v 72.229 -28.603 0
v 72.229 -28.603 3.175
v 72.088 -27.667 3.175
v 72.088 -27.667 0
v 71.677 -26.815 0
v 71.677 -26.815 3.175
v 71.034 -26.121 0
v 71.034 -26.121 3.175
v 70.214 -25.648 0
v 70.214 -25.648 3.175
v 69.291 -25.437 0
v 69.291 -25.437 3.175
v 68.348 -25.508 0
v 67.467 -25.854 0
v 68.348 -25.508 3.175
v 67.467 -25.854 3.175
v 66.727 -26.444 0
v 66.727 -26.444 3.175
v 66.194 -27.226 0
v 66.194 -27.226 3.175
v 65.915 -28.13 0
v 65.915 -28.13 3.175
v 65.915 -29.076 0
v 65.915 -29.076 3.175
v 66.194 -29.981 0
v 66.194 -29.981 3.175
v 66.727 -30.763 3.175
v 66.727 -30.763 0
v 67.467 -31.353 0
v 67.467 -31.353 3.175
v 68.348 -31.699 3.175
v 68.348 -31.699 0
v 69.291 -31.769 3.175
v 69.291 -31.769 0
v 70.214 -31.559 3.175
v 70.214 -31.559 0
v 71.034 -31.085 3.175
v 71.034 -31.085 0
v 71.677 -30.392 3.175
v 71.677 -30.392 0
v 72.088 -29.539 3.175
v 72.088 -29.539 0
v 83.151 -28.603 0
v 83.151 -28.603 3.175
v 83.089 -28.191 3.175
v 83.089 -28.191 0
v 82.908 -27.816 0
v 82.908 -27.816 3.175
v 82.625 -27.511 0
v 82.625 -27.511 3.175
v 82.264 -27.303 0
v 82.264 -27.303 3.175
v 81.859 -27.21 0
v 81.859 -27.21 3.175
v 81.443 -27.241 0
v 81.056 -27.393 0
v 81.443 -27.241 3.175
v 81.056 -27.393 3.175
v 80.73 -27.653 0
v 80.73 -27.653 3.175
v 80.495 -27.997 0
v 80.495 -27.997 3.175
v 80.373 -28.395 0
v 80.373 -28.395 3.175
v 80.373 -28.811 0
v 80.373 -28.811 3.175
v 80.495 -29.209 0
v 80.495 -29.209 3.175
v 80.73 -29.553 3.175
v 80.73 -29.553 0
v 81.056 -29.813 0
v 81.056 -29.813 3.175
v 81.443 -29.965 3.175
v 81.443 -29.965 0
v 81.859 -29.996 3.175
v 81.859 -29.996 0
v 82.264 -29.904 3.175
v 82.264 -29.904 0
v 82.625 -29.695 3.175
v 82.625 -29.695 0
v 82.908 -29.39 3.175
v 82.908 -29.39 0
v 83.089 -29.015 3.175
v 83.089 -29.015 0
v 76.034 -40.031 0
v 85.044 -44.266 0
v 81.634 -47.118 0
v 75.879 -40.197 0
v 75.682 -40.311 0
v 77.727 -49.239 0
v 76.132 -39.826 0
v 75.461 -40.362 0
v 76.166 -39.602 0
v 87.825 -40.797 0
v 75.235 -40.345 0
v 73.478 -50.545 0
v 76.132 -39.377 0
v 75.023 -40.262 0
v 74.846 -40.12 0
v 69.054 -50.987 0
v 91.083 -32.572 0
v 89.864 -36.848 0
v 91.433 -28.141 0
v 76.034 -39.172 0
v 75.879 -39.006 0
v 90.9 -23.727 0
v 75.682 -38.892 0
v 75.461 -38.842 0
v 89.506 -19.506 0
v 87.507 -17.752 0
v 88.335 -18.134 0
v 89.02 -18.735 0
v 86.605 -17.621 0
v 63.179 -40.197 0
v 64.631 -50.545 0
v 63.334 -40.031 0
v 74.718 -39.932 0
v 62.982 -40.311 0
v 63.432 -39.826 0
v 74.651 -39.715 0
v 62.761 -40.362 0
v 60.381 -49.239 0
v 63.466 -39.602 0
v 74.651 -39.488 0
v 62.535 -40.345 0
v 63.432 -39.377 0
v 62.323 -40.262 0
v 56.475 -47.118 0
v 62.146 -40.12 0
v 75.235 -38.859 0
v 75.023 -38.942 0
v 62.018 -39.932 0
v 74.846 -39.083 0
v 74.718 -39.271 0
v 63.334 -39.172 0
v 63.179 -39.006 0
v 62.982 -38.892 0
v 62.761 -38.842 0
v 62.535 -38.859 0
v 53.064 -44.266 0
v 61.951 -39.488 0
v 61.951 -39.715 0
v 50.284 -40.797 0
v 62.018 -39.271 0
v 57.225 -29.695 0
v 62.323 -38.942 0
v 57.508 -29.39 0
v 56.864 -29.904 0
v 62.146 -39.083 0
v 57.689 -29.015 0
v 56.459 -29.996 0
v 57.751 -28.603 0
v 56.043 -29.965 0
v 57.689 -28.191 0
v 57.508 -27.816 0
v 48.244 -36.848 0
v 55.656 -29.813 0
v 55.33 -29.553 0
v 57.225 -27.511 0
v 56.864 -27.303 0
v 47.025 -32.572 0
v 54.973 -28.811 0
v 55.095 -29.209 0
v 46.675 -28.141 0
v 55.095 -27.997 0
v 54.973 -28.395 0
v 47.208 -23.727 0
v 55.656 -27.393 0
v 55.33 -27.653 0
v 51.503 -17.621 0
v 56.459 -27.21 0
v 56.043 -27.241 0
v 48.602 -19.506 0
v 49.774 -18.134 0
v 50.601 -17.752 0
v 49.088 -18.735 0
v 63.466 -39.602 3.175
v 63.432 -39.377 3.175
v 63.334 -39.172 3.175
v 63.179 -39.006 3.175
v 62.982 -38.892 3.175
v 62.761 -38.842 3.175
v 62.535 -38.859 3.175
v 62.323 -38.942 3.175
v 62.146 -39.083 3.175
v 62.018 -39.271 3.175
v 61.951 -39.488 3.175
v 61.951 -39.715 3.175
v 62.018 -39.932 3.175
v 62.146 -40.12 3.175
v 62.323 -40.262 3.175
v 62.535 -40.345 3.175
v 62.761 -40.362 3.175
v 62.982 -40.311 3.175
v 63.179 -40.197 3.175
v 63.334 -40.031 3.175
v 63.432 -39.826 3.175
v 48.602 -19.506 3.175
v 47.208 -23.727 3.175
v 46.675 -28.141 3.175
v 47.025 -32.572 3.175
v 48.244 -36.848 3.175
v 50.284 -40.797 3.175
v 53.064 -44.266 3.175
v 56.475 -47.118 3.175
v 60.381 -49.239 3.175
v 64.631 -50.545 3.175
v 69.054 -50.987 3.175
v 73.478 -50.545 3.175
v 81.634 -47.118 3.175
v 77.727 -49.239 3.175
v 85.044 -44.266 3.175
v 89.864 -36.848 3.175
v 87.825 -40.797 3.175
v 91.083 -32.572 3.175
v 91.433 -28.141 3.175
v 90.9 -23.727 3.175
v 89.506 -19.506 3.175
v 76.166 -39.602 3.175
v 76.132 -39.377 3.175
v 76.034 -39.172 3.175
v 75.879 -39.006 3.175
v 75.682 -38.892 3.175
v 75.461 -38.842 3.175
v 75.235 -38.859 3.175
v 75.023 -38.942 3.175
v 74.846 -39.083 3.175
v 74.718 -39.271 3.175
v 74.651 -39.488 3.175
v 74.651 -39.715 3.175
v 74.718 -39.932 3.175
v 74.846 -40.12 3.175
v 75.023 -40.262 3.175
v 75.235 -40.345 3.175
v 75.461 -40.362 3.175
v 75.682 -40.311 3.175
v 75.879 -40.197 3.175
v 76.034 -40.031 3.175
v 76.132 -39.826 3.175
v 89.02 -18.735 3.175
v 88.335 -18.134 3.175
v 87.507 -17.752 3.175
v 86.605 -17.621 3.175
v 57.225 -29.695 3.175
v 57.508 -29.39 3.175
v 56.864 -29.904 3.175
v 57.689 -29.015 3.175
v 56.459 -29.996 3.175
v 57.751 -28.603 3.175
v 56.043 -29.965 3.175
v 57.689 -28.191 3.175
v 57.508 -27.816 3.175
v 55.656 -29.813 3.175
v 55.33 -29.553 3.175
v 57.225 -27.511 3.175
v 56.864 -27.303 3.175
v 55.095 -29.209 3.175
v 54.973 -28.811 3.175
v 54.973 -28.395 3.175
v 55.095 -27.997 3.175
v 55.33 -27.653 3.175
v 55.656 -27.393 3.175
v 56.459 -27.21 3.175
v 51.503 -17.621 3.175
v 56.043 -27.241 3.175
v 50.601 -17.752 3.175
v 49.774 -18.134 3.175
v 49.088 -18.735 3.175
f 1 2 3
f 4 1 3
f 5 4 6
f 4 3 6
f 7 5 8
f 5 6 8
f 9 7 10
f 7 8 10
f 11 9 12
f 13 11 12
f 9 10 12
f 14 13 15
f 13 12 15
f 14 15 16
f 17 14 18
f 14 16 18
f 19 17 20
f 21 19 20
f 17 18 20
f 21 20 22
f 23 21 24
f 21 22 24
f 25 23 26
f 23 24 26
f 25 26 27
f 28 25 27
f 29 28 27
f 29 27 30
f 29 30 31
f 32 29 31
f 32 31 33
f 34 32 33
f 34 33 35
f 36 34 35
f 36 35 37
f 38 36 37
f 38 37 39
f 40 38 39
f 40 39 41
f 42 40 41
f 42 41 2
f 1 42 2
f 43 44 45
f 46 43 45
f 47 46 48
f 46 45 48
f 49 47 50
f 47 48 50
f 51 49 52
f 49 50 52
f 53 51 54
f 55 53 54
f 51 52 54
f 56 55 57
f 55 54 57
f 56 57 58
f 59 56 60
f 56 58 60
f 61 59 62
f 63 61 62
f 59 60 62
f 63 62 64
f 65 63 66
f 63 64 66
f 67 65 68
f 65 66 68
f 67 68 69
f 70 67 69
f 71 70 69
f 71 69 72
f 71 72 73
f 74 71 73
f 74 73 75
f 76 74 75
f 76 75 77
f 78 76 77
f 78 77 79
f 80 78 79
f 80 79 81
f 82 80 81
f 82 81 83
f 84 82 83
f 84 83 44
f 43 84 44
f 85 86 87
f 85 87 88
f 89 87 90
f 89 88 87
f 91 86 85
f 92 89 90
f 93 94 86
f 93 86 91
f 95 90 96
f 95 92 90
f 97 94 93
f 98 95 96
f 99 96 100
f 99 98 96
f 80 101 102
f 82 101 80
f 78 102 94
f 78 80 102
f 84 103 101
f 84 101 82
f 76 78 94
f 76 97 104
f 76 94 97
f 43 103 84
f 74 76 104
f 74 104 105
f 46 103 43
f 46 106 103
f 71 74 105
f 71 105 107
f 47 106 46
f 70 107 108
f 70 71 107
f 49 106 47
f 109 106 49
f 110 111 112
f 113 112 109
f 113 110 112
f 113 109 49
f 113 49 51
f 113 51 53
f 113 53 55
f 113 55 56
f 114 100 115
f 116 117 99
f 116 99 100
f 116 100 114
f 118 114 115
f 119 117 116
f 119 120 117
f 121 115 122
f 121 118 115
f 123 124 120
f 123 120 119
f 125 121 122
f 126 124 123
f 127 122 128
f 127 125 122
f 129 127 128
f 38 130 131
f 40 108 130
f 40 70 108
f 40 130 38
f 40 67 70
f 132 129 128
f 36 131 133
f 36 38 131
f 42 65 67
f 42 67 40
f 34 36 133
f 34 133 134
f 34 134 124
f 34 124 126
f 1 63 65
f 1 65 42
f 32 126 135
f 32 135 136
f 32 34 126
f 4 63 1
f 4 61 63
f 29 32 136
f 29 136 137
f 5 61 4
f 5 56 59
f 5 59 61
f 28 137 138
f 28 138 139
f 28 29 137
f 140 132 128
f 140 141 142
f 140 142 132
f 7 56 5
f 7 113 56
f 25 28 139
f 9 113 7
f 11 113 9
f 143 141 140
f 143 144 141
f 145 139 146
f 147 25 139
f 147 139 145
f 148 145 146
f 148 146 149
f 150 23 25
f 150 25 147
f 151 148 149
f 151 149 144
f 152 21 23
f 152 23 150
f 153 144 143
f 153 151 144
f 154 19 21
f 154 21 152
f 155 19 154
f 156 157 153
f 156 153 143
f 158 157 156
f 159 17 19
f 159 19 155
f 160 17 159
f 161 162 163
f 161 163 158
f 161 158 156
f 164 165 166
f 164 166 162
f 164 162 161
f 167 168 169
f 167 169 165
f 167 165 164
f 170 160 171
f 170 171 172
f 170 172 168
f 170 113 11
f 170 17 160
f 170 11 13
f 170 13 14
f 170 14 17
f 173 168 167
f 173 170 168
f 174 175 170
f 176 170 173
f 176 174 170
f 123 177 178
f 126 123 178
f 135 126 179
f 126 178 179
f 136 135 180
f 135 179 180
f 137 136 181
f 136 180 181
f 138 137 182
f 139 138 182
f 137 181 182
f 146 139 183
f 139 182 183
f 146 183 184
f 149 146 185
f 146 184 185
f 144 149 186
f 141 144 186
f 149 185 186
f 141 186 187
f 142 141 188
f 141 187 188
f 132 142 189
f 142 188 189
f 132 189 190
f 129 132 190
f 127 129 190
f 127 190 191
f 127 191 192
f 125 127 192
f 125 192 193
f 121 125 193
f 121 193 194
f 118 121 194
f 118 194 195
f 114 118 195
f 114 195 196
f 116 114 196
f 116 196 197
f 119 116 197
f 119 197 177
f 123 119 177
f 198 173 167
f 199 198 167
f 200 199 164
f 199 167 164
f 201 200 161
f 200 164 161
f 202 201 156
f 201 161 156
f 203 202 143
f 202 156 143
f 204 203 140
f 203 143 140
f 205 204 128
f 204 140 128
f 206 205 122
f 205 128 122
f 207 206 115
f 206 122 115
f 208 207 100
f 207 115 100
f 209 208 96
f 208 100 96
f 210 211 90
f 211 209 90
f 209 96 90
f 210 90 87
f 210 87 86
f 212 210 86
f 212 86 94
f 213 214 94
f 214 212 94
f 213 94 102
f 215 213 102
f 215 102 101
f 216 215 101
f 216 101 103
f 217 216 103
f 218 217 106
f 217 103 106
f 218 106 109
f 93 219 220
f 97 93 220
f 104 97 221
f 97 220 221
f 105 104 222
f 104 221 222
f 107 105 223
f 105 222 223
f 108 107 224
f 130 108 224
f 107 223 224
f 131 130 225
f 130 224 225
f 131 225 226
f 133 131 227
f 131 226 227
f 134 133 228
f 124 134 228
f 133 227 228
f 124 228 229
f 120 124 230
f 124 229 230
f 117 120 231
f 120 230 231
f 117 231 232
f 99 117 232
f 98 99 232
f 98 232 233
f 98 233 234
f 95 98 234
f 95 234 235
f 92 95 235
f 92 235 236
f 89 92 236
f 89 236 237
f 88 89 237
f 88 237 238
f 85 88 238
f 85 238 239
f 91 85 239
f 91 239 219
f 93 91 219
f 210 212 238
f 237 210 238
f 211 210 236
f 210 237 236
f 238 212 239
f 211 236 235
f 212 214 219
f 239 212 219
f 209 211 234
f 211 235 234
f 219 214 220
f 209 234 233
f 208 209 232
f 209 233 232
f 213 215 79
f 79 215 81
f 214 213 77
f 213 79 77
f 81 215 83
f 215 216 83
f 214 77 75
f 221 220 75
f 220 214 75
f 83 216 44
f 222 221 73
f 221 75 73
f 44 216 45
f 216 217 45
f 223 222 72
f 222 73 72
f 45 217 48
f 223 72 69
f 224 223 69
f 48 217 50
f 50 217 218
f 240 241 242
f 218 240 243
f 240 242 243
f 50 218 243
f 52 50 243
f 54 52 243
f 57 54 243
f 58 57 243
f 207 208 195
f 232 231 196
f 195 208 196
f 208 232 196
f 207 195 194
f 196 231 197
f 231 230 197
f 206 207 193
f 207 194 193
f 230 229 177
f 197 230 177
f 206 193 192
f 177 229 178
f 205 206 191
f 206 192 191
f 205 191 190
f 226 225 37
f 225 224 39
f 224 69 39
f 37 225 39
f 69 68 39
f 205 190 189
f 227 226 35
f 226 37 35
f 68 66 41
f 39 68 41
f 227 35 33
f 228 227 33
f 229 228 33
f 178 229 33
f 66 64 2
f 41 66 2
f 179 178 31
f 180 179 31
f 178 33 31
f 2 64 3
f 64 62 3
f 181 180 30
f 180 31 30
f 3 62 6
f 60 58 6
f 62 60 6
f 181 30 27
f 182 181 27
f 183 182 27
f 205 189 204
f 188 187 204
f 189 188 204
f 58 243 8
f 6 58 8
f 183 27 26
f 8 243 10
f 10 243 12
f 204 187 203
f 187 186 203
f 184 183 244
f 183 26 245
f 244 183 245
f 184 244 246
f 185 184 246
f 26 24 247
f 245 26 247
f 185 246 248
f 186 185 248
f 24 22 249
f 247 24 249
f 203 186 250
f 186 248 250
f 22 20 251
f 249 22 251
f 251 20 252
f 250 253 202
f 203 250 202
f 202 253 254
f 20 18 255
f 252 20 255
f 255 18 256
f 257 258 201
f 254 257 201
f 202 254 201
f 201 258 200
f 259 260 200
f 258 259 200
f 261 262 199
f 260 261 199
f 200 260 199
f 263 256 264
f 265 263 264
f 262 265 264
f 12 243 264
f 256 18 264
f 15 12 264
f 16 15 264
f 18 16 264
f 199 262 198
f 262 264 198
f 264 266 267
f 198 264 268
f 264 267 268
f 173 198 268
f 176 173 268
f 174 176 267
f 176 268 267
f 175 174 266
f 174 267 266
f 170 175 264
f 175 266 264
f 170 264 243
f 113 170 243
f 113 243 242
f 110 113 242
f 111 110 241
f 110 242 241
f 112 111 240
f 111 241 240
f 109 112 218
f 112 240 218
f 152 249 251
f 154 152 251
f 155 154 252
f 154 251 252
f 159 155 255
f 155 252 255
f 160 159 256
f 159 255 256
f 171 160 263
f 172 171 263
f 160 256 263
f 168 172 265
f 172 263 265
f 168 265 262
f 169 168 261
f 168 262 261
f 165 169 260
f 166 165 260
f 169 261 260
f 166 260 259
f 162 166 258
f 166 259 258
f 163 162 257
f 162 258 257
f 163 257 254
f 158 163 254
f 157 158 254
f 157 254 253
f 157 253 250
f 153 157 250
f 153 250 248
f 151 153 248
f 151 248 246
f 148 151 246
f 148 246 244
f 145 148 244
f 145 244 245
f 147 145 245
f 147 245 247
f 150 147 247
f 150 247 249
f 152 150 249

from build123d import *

# Parameters (mm, degrees)
SKETCH1_R           = 22.38375
BOSS_EXTRUDE1_DEPTH = 3.175
CUT_EXTRUDE1_REACH  = 5.175
SKETCH2_R           = 38.03700281
CUT_EXTRUDE3_REACH  = 5.175
SKETCH4_R           = 1.397
SKETCH4_R_2         = 0.762
BOSS_EXTRUDE2_DEPTH = 3.175
CUT_EXTRUDE4_REACH  = 5.175
SKETCH8_R           = 3.175


with BuildPart() as part:
    # Sketch1 → Boss-Extrude1 (new body)
    with BuildSketch(Plane.XY):
        with Locations((69.054102373, -28.60314574)):
            Circle(SKETCH1_R)
    extrude(amount=BOSS_EXTRUDE1_DEPTH)

    # Sketch2 → Cut-Extrude1 (cut, up to next)
    with BuildSketch(Plane.XY.offset(3.175), mode=Mode.PRIVATE) as cut_extrude1_sk1:
        with Locations((69.054102373, 12.564876285)):
            Circle(SKETCH2_R)
    cut_extrude1_tool1 = extrude(cut_extrude1_sk1.sketch, amount=-CUT_EXTRUDE1_REACH, mode=Mode.PRIVATE) & part.part
    add(cut_extrude1_tool1.solids().sort_by_distance((69.054102, 12.564876, 3.175))[0], mode=Mode.SUBTRACT)

    # Sketch4 → Cut-Extrude3 (cut, up to next)
    with BuildSketch(Plane.XY.offset(3.175), mode=Mode.PRIVATE) as cut_extrude3_sk1:
        with Locations((56.354102373, -28.60314574)):
            Circle(SKETCH4_R)
    cut_extrude3_tool1 = extrude(cut_extrude3_sk1.sketch, amount=-CUT_EXTRUDE3_REACH, mode=Mode.PRIVATE) & part.part
    add(cut_extrude3_tool1.solids().sort_by_distance((56.354102, -28.603146, 3.175))[0], mode=Mode.SUBTRACT)
    # Sketch4 → Cut-Extrude3 (cut, up to next)
    with BuildSketch(Plane.XY.offset(3.175), mode=Mode.PRIVATE) as cut_extrude3_sk2:
        with Locations((81.754102373, -28.60314574)):
            Circle(SKETCH4_R)
    cut_extrude3_tool2 = extrude(cut_extrude3_sk2.sketch, amount=-CUT_EXTRUDE3_REACH, mode=Mode.PRIVATE) & part.part
    add(cut_extrude3_tool2.solids().sort_by_distance((81.754102, -28.603146, 3.175))[0], mode=Mode.SUBTRACT)
    # Sketch4 → Cut-Extrude3 (cut, up to next)
    with BuildSketch(Plane.XY.offset(3.175), mode=Mode.PRIVATE) as cut_extrude3_sk3:
        with Locations((62.704102373, -39.601668368)):
            Circle(SKETCH4_R_2)
    cut_extrude3_tool3 = extrude(cut_extrude3_sk3.sketch, amount=-CUT_EXTRUDE3_REACH, mode=Mode.PRIVATE) & part.part
    add(cut_extrude3_tool3.solids().sort_by_distance((62.704102, -39.601668, 3.175))[0], mode=Mode.SUBTRACT)
    # Sketch4 → Cut-Extrude3 (cut, up to next)
    with BuildSketch(Plane.XY.offset(3.175), mode=Mode.PRIVATE) as cut_extrude3_sk4:
        with Locations((75.404102373, -39.601668368)):
            Circle(SKETCH4_R_2)
    cut_extrude3_tool4 = extrude(cut_extrude3_sk4.sketch, amount=-CUT_EXTRUDE3_REACH, mode=Mode.PRIVATE) & part.part
    add(cut_extrude3_tool4.solids().sort_by_distance((75.404102, -39.601668, 3.175))[0], mode=Mode.SUBTRACT)

    # Sketch7 → Boss-Extrude2 (add)
    with BuildSketch(Plane.XY.offset(3.175)):
        with BuildLine():
            Line((51.503315193, -17.621357289), (86.604889553, -17.621357289))
            ThreePointArc((86.604889553, -17.621357289), (88.334582305, -18.133879499), (89.505846111, -19.505979033))
            ThreePointArc((89.505846111, -19.505979033), (69.054102373, -25.472126525), (48.602358634, -19.505979033))
            ThreePointArc((48.602358634, -19.505979033), (49.77362244, -18.133879499), (51.503315193, -17.621357289))
        make_face()
    extrude(amount=-BOSS_EXTRUDE2_DEPTH)

    # Sketch8 → Cut-Extrude4 (cut, up to next)
    with BuildSketch(Plane.XY.offset(3.175), mode=Mode.PRIVATE) as cut_extrude4_sk1:
        with Locations((69.054102373, -28.60314574)):
            Circle(SKETCH8_R)
    cut_extrude4_tool1 = extrude(cut_extrude4_sk1.sketch, amount=-CUT_EXTRUDE4_REACH, mode=Mode.PRIVATE) & part.part
    add(cut_extrude4_tool1.solids().sort_by_distance((69.054102, -28.603146, 3.175))[0], mode=Mode.SUBTRACT)


solid = part.part
